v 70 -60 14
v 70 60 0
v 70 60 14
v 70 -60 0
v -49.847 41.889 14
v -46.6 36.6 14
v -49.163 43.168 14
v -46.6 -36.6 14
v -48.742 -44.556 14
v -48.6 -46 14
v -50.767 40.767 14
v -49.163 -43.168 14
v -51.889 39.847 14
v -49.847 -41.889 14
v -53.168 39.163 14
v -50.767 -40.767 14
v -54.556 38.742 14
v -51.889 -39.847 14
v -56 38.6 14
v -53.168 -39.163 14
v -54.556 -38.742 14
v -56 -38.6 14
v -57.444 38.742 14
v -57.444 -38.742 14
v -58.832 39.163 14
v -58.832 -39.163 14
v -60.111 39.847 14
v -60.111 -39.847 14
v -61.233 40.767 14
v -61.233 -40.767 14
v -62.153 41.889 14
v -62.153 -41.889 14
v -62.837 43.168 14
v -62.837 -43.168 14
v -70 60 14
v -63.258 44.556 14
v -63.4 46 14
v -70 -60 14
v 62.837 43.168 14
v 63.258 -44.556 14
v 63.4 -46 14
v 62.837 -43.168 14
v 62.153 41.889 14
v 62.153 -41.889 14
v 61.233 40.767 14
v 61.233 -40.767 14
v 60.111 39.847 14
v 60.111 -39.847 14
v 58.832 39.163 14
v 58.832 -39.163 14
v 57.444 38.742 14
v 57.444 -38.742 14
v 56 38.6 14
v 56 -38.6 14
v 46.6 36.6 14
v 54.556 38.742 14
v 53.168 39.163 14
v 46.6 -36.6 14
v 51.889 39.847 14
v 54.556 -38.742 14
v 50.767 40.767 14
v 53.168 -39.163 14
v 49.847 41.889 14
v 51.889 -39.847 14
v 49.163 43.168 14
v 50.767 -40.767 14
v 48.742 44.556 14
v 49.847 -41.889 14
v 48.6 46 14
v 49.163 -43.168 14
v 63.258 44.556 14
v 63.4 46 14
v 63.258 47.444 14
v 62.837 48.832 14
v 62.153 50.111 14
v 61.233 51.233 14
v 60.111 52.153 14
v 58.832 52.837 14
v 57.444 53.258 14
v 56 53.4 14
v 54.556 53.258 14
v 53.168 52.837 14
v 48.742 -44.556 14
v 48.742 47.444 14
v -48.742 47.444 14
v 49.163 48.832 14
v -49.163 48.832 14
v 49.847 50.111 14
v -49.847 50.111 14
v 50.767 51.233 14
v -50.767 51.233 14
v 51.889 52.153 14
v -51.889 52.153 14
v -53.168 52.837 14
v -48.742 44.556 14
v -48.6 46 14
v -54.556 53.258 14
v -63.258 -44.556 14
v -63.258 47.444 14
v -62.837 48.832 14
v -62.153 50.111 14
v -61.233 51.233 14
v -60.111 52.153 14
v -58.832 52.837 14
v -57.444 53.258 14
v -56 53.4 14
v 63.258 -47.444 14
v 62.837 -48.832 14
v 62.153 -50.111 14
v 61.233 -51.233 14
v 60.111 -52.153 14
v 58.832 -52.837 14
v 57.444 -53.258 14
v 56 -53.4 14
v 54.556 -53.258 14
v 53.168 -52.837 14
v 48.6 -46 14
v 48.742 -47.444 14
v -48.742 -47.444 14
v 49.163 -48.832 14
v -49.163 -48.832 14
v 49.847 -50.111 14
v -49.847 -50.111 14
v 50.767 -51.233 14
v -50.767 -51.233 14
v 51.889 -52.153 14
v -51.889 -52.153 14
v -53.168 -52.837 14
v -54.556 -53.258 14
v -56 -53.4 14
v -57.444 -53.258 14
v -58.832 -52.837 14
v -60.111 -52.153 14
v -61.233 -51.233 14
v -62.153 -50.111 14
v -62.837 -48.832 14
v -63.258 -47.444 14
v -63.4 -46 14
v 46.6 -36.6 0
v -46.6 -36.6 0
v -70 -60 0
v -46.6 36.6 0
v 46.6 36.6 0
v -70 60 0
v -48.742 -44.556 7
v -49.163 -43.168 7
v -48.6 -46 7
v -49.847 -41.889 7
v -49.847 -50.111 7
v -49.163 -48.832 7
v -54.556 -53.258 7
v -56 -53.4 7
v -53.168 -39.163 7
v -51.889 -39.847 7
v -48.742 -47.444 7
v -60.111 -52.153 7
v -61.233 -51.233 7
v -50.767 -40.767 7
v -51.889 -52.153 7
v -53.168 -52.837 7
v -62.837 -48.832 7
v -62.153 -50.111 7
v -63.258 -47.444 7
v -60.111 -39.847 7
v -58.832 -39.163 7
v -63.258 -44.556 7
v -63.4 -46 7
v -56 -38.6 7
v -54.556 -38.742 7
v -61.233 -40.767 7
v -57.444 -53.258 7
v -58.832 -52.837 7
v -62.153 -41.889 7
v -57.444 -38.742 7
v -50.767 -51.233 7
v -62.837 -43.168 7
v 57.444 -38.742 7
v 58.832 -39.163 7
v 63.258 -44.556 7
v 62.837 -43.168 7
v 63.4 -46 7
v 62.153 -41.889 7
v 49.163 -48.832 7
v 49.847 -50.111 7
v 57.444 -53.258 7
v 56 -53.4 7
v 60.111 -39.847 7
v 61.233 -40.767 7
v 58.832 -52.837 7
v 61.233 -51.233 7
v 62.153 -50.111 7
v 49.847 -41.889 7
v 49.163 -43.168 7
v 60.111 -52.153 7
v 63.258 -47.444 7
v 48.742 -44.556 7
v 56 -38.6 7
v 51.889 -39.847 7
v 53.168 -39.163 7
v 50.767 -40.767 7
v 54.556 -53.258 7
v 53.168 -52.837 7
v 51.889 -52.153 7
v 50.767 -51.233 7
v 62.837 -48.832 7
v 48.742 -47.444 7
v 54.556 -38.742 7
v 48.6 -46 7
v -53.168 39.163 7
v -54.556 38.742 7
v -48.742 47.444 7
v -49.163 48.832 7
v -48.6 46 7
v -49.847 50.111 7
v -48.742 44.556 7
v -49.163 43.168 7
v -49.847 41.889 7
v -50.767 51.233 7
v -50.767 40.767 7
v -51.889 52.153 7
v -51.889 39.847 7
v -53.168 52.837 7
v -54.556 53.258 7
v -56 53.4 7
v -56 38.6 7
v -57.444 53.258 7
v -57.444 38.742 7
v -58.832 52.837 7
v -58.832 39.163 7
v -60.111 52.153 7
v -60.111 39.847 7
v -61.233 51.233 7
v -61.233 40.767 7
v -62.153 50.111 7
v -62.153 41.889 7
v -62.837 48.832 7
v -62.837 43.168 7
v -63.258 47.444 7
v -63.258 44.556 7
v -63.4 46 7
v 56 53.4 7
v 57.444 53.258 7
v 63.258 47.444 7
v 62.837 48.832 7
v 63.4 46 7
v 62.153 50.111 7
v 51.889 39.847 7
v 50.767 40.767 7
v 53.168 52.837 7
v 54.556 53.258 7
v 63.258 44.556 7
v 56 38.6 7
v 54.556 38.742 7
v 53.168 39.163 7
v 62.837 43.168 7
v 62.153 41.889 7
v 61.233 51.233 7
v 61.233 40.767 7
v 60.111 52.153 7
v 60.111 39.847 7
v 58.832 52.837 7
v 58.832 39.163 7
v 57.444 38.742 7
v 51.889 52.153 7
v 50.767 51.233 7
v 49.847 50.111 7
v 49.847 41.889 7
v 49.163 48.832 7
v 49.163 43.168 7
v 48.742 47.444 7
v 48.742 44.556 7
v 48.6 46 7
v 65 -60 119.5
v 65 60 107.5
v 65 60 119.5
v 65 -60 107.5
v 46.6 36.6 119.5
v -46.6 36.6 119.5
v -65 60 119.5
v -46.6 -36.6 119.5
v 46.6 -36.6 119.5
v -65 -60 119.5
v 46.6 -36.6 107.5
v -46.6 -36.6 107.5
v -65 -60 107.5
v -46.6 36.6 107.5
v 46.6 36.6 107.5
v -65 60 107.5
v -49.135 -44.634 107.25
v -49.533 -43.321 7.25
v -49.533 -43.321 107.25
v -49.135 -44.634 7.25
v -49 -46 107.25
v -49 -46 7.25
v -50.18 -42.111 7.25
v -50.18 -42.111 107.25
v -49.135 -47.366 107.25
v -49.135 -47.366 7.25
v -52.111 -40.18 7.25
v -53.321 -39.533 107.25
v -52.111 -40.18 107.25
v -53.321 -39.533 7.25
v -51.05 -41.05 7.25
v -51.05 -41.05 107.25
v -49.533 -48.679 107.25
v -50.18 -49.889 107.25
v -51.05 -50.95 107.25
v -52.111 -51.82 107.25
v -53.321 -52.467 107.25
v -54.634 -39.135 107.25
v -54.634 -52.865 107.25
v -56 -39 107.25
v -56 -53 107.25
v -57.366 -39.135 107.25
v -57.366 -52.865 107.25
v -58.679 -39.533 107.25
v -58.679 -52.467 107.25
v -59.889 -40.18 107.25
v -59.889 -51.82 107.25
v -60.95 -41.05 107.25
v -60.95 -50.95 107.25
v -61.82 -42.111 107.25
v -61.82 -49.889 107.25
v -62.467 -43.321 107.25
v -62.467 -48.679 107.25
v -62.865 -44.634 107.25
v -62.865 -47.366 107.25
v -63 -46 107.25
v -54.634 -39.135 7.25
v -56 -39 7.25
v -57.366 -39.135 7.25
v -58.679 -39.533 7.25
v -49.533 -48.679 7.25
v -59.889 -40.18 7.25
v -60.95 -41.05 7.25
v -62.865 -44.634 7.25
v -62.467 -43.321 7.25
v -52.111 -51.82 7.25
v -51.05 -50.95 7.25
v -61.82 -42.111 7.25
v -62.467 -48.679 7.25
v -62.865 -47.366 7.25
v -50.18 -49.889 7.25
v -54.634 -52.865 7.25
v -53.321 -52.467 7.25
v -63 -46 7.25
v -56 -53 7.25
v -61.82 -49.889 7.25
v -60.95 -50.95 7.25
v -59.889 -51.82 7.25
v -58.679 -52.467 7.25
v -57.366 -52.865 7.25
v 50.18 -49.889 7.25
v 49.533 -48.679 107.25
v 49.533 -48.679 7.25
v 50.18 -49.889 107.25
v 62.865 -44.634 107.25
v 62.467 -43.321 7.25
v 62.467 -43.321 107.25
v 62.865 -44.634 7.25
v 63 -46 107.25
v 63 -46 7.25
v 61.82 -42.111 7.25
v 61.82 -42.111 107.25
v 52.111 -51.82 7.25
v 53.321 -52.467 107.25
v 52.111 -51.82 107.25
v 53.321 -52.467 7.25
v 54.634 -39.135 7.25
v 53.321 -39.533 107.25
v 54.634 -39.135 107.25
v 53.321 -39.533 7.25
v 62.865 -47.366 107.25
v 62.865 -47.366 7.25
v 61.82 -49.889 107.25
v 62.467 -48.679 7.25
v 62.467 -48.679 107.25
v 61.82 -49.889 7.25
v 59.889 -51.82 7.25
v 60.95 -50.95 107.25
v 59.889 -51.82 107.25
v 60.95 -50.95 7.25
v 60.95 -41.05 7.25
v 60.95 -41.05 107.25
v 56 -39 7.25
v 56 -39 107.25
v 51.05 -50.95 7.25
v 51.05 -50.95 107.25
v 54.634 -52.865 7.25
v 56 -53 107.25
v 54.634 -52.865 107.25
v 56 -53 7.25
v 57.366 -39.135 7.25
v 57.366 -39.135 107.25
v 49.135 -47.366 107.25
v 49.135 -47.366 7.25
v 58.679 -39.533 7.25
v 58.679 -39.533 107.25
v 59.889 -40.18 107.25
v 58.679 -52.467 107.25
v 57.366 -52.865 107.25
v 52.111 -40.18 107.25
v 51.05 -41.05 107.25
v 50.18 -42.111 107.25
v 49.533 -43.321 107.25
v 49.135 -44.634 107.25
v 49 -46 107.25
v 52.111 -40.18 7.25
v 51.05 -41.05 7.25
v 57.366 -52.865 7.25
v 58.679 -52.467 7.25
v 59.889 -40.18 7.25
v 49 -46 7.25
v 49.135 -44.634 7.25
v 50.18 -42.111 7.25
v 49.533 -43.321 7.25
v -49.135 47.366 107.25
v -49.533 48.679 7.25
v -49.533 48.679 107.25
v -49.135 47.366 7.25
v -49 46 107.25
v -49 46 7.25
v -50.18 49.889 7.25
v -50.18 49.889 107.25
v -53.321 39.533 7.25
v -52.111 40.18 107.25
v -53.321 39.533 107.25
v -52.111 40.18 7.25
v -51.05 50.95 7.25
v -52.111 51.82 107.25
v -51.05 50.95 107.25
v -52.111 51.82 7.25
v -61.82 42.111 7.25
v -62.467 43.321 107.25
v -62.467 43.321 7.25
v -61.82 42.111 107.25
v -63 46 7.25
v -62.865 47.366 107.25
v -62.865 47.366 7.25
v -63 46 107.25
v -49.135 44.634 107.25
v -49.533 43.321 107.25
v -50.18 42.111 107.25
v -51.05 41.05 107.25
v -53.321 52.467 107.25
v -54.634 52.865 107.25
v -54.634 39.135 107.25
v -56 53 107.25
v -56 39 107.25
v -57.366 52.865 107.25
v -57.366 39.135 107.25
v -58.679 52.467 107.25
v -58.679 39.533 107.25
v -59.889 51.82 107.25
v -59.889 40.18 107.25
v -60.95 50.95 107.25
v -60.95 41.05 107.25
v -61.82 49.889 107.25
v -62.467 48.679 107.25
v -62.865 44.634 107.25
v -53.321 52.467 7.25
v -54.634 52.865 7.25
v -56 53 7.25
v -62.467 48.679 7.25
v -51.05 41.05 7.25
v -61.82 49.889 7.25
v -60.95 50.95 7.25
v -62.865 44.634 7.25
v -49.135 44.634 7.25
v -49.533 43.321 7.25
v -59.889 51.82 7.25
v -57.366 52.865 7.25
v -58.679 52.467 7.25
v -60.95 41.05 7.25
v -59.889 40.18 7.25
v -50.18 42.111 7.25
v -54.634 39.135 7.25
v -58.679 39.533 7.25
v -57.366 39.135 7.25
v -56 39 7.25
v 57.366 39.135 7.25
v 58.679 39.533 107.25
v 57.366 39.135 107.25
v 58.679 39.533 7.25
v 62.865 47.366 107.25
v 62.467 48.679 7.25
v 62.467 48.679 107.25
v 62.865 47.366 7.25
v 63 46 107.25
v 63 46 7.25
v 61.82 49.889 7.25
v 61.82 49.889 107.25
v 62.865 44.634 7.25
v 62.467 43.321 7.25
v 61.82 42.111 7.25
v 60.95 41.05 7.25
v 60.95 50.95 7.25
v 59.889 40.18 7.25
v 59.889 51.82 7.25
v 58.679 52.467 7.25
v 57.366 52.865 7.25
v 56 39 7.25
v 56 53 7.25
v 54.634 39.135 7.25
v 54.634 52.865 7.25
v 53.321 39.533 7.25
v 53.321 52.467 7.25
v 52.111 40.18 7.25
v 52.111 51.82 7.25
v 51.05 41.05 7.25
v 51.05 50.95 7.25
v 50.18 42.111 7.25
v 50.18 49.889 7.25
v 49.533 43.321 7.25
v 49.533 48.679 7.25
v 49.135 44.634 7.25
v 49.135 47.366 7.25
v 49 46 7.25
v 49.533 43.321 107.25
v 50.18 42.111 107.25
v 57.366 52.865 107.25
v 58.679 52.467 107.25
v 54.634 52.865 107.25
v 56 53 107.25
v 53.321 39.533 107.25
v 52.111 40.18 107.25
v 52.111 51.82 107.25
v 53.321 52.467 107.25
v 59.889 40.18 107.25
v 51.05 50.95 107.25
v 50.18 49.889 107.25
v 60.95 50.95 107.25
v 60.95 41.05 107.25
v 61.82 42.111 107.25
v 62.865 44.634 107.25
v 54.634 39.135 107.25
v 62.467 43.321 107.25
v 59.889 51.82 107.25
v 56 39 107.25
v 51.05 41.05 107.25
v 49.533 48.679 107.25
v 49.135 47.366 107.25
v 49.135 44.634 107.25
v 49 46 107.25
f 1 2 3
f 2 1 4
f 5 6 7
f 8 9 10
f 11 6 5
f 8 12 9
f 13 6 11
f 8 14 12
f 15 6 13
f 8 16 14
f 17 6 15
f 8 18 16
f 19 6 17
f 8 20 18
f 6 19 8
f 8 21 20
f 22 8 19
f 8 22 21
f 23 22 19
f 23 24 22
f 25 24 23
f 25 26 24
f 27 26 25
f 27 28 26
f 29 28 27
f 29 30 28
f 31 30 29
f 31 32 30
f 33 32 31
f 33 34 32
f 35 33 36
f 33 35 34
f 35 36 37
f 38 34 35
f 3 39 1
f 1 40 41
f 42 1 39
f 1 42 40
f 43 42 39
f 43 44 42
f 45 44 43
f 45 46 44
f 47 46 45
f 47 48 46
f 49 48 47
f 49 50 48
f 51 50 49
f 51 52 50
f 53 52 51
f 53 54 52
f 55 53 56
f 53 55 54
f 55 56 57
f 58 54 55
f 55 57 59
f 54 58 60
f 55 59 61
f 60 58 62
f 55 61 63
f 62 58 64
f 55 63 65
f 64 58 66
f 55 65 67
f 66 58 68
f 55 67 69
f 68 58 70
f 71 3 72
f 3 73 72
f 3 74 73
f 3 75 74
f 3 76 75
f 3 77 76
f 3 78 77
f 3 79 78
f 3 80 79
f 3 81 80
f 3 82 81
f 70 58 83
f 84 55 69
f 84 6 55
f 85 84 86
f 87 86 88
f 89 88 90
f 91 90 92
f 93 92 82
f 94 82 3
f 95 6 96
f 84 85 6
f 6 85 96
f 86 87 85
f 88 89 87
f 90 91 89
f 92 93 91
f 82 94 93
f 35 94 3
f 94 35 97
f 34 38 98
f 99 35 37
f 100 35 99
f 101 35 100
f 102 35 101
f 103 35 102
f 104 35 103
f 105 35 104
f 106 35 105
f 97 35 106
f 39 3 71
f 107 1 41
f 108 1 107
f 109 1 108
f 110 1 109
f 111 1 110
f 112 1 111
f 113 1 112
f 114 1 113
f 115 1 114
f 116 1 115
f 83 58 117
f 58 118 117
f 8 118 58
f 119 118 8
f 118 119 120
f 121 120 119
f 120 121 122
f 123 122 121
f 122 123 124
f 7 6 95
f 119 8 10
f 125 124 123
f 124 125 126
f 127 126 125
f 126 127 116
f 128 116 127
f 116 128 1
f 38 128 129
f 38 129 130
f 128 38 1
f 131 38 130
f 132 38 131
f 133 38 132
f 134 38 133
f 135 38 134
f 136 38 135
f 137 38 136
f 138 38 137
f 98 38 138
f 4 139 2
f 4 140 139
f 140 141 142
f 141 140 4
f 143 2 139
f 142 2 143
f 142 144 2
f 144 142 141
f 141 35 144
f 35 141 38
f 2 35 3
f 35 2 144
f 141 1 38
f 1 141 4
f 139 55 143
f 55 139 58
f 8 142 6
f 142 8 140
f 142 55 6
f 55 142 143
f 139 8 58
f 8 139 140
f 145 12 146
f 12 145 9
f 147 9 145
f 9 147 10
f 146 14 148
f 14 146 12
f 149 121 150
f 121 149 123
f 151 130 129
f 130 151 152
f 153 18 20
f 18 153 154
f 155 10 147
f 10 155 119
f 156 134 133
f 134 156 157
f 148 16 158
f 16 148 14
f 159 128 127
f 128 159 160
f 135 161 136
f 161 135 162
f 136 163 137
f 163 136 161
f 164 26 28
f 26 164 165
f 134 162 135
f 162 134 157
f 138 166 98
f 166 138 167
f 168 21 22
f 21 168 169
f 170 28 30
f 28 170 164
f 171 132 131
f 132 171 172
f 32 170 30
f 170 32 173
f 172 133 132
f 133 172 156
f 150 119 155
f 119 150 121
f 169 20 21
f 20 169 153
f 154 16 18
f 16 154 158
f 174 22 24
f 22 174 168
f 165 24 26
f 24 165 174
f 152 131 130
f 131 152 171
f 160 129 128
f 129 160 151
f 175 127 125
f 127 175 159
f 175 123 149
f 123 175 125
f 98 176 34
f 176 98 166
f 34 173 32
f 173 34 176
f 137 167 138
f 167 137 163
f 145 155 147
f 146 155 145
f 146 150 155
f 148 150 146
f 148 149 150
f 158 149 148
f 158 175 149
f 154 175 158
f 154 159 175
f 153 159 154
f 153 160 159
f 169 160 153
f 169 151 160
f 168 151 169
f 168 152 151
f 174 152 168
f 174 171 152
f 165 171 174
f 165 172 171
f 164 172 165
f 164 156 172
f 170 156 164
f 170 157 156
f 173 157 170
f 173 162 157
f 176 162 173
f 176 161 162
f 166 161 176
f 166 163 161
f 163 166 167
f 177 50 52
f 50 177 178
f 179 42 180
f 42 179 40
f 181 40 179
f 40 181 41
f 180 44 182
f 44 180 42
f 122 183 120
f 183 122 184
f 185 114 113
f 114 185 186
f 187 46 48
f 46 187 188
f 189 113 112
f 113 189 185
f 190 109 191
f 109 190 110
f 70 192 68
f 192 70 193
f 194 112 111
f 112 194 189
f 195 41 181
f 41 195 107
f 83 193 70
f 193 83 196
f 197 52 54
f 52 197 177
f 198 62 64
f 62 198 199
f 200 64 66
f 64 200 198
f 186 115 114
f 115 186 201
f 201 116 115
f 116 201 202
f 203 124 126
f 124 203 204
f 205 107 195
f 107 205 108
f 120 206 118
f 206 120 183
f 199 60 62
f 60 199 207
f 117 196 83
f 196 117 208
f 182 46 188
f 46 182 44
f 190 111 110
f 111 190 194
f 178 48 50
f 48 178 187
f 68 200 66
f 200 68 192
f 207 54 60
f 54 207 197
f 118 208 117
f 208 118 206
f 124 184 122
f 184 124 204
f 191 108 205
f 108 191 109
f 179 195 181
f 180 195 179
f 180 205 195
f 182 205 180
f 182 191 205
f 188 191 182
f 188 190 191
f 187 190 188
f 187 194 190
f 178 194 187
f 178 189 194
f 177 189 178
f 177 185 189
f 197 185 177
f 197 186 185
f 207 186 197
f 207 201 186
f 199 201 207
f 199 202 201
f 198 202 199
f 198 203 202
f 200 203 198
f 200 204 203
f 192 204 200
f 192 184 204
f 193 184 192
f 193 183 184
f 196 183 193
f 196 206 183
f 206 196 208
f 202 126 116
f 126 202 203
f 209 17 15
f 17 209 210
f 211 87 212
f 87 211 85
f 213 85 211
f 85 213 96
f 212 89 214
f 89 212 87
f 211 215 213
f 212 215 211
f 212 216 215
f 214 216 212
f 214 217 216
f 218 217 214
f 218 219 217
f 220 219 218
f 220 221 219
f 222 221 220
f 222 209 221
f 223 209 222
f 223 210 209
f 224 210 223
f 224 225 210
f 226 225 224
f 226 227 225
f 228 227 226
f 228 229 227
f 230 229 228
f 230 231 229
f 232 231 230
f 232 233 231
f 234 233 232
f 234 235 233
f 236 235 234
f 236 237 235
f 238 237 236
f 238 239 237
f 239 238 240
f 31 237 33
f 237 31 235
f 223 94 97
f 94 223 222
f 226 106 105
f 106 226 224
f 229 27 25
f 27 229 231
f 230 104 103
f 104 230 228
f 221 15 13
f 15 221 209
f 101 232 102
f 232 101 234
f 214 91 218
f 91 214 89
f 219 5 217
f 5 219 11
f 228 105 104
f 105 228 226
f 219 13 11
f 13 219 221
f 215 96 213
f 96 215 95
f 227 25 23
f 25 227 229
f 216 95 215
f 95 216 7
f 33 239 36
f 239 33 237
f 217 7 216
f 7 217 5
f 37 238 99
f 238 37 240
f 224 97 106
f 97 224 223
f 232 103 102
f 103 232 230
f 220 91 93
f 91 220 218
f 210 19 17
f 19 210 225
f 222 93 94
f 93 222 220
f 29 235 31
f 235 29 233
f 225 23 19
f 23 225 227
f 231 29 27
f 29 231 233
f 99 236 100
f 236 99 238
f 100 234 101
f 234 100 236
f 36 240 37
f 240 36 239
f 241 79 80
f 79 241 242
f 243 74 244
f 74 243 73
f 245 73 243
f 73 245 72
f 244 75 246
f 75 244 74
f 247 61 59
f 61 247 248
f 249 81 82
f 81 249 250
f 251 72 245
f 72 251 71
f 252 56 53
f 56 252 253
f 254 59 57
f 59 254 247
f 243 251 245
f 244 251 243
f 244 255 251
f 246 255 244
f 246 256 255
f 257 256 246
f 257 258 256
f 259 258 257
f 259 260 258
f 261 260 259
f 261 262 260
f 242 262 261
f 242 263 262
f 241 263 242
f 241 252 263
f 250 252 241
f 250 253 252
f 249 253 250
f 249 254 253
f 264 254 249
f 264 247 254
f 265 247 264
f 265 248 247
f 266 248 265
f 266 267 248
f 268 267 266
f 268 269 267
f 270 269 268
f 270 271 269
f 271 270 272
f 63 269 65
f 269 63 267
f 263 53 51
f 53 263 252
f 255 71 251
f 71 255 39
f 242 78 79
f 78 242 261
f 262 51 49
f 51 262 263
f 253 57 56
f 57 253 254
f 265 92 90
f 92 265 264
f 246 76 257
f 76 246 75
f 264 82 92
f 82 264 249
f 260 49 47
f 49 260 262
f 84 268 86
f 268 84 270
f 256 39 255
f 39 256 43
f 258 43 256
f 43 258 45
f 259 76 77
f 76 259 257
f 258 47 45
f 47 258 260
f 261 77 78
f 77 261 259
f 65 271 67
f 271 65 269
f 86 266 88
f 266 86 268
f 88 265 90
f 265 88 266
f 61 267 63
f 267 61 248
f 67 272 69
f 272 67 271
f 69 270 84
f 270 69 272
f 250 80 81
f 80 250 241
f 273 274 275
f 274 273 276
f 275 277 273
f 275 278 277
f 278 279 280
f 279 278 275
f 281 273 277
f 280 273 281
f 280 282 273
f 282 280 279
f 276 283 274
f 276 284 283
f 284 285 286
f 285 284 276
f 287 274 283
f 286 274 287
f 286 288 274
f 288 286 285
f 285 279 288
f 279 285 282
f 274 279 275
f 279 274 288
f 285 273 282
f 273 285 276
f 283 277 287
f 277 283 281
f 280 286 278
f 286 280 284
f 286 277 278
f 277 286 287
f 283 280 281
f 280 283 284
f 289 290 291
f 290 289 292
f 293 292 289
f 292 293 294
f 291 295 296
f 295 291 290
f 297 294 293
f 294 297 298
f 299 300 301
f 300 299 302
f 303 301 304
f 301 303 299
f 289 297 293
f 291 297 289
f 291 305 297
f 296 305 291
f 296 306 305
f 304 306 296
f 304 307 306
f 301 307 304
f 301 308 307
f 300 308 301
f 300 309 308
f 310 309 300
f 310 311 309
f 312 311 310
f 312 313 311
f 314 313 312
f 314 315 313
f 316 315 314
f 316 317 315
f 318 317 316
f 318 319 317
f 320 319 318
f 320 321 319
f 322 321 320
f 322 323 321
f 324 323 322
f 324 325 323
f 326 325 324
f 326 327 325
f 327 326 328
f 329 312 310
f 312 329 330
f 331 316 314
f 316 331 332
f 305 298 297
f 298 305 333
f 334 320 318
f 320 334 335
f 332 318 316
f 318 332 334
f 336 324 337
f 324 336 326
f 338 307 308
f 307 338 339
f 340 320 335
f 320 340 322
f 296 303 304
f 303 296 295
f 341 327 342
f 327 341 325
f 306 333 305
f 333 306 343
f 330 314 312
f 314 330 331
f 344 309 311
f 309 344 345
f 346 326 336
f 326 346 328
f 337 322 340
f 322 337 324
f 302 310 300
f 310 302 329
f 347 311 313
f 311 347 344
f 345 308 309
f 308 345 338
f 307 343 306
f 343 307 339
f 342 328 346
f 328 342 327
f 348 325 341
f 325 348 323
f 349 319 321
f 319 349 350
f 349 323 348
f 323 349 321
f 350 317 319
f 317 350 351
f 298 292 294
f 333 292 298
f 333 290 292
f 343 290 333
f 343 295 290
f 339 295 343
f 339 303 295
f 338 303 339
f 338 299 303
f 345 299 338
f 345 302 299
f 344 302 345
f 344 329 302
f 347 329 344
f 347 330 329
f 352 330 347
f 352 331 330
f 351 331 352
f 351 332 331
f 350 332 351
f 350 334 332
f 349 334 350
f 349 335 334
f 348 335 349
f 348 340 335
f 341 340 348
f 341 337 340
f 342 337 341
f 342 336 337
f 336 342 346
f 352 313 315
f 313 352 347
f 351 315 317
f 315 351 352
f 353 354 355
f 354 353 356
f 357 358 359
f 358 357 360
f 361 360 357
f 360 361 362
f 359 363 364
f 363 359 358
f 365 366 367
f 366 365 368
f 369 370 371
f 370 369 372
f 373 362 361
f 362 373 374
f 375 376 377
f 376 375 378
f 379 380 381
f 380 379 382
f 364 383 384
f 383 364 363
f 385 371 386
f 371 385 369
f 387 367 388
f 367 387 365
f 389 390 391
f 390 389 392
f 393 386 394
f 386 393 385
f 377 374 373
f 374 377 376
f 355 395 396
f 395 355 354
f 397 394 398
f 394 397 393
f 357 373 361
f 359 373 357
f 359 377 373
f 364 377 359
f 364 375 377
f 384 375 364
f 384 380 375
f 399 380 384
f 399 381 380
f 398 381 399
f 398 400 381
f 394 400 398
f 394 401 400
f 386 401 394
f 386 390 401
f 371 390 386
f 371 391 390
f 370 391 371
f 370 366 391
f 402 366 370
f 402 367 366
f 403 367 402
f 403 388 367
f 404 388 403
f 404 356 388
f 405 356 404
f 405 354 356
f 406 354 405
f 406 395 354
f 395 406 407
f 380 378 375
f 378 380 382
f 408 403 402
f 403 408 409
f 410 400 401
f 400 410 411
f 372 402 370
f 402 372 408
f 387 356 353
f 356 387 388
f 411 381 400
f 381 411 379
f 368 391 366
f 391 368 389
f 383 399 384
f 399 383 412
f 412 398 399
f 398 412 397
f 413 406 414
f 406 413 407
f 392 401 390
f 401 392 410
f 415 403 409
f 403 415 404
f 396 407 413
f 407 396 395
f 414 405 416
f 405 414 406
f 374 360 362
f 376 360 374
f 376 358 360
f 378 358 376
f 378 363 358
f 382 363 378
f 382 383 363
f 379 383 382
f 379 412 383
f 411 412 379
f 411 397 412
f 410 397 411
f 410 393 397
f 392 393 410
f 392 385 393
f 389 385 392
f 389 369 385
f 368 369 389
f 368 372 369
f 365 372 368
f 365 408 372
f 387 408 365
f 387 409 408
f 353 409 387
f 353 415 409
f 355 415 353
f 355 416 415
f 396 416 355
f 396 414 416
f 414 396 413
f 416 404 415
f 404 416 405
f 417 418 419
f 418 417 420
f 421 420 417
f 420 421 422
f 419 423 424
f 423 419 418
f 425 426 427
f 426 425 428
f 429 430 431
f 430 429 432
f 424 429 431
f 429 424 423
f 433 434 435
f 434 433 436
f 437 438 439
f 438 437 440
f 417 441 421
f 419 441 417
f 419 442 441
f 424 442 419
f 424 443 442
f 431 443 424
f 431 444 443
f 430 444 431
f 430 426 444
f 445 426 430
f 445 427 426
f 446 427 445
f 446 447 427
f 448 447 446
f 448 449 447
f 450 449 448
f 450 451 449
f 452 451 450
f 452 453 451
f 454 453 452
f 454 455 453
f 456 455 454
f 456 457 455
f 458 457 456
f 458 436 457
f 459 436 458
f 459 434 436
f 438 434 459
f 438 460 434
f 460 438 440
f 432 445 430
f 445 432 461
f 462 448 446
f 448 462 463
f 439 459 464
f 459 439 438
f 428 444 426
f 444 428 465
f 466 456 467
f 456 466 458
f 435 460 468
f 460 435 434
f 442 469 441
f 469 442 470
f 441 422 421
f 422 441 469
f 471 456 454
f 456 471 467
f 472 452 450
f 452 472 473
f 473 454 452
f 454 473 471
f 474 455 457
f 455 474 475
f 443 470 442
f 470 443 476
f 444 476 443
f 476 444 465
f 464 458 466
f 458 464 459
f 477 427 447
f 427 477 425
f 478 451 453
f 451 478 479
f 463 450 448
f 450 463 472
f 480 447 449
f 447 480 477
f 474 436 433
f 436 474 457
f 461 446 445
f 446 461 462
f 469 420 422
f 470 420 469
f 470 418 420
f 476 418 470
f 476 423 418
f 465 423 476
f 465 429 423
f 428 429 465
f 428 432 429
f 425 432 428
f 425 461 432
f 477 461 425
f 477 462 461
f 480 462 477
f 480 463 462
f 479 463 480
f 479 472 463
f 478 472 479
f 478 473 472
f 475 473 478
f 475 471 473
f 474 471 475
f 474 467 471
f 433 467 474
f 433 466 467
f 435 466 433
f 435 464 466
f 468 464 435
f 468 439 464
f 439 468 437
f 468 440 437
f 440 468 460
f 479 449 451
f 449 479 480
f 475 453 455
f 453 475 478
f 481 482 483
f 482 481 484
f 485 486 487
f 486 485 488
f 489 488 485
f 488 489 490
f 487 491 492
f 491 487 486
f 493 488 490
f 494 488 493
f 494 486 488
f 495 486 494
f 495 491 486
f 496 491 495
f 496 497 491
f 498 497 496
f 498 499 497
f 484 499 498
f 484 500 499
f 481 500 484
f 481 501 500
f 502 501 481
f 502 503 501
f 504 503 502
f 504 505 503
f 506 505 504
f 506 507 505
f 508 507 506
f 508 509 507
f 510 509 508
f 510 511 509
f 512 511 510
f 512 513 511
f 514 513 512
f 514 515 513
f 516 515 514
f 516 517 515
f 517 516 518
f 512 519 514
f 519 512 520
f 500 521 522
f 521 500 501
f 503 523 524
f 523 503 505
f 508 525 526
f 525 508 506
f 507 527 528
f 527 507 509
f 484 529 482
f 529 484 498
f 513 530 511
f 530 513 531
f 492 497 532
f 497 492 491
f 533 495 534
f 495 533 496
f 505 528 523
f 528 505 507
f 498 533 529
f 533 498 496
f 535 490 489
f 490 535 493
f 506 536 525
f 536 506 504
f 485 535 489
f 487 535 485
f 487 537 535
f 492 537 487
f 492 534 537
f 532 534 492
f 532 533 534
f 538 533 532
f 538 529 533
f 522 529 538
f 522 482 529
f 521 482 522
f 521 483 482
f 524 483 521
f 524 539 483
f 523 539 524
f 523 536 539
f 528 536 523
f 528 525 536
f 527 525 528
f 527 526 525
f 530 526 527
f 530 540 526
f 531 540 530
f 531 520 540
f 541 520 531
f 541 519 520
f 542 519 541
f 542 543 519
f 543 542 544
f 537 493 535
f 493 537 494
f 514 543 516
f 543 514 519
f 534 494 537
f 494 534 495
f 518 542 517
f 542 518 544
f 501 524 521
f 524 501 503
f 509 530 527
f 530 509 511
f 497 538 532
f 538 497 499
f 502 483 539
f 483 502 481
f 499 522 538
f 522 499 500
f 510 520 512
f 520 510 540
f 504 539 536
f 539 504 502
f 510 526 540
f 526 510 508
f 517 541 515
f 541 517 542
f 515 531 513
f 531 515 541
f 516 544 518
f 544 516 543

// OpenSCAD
$fn = 32;

// ------------------------------------------------------------------------
// Frame cube: base 140 x 120 mm, posts 100 mm tall
// Every part is its own module, assembly() places every instance.
// ------------------------------------------------------------------------

// --- part 1 ---
module base_frame() {
  difference() {
    translate([-70, -60, 0]) cube([140, 120, 14]);
    translate([-46.6, -36.6, -1]) cube([93.2, 73.2, 16]);
    translate([-56, -46, 7]) cylinder(h = 8, d = 14.8);
    translate([56, -46, 7]) cylinder(h = 8, d = 14.8);
    translate([-56, 46, 7]) cylinder(h = 8, d = 14.8);
    translate([56, 46, 7]) cylinder(h = 8, d = 14.8);
  }
}

// --- part 2 ---
module corner_post() {
  cylinder(h = 100, d = 14);
}

// --- part 3 ---
module top_frame() {
  difference() {
    translate([-65, -60, 0]) cube([130, 120, 12]);
    translate([-46.6, -36.6, -1]) cube([93.2, 73.2, 14]);
  }
}

// --- assembly ---
module assembly() {
  color([0.80, 0.24, 0.20]) translate([0, 0, 0]) rotate([0, 0, 0]) base_frame();
  color([0.20, 0.45, 0.75]) translate([-56, -46, 7.25]) rotate([0, 0, 0]) corner_post();
  color([0.25, 0.62, 0.32]) translate([56, -46, 7.25]) rotate([0, 0, 0]) corner_post();
  color([0.92, 0.70, 0.18]) translate([-56, 46, 7.25]) rotate([0, 0, 0]) corner_post();
  color([0.58, 0.35, 0.70]) translate([56, 46, 7.25]) rotate([0, 0, 0]) corner_post();
  color([0.16, 0.66, 0.66]) translate([0, 0, 107.5]) rotate([0, 0, 0]) top_frame();
}

assembly();
